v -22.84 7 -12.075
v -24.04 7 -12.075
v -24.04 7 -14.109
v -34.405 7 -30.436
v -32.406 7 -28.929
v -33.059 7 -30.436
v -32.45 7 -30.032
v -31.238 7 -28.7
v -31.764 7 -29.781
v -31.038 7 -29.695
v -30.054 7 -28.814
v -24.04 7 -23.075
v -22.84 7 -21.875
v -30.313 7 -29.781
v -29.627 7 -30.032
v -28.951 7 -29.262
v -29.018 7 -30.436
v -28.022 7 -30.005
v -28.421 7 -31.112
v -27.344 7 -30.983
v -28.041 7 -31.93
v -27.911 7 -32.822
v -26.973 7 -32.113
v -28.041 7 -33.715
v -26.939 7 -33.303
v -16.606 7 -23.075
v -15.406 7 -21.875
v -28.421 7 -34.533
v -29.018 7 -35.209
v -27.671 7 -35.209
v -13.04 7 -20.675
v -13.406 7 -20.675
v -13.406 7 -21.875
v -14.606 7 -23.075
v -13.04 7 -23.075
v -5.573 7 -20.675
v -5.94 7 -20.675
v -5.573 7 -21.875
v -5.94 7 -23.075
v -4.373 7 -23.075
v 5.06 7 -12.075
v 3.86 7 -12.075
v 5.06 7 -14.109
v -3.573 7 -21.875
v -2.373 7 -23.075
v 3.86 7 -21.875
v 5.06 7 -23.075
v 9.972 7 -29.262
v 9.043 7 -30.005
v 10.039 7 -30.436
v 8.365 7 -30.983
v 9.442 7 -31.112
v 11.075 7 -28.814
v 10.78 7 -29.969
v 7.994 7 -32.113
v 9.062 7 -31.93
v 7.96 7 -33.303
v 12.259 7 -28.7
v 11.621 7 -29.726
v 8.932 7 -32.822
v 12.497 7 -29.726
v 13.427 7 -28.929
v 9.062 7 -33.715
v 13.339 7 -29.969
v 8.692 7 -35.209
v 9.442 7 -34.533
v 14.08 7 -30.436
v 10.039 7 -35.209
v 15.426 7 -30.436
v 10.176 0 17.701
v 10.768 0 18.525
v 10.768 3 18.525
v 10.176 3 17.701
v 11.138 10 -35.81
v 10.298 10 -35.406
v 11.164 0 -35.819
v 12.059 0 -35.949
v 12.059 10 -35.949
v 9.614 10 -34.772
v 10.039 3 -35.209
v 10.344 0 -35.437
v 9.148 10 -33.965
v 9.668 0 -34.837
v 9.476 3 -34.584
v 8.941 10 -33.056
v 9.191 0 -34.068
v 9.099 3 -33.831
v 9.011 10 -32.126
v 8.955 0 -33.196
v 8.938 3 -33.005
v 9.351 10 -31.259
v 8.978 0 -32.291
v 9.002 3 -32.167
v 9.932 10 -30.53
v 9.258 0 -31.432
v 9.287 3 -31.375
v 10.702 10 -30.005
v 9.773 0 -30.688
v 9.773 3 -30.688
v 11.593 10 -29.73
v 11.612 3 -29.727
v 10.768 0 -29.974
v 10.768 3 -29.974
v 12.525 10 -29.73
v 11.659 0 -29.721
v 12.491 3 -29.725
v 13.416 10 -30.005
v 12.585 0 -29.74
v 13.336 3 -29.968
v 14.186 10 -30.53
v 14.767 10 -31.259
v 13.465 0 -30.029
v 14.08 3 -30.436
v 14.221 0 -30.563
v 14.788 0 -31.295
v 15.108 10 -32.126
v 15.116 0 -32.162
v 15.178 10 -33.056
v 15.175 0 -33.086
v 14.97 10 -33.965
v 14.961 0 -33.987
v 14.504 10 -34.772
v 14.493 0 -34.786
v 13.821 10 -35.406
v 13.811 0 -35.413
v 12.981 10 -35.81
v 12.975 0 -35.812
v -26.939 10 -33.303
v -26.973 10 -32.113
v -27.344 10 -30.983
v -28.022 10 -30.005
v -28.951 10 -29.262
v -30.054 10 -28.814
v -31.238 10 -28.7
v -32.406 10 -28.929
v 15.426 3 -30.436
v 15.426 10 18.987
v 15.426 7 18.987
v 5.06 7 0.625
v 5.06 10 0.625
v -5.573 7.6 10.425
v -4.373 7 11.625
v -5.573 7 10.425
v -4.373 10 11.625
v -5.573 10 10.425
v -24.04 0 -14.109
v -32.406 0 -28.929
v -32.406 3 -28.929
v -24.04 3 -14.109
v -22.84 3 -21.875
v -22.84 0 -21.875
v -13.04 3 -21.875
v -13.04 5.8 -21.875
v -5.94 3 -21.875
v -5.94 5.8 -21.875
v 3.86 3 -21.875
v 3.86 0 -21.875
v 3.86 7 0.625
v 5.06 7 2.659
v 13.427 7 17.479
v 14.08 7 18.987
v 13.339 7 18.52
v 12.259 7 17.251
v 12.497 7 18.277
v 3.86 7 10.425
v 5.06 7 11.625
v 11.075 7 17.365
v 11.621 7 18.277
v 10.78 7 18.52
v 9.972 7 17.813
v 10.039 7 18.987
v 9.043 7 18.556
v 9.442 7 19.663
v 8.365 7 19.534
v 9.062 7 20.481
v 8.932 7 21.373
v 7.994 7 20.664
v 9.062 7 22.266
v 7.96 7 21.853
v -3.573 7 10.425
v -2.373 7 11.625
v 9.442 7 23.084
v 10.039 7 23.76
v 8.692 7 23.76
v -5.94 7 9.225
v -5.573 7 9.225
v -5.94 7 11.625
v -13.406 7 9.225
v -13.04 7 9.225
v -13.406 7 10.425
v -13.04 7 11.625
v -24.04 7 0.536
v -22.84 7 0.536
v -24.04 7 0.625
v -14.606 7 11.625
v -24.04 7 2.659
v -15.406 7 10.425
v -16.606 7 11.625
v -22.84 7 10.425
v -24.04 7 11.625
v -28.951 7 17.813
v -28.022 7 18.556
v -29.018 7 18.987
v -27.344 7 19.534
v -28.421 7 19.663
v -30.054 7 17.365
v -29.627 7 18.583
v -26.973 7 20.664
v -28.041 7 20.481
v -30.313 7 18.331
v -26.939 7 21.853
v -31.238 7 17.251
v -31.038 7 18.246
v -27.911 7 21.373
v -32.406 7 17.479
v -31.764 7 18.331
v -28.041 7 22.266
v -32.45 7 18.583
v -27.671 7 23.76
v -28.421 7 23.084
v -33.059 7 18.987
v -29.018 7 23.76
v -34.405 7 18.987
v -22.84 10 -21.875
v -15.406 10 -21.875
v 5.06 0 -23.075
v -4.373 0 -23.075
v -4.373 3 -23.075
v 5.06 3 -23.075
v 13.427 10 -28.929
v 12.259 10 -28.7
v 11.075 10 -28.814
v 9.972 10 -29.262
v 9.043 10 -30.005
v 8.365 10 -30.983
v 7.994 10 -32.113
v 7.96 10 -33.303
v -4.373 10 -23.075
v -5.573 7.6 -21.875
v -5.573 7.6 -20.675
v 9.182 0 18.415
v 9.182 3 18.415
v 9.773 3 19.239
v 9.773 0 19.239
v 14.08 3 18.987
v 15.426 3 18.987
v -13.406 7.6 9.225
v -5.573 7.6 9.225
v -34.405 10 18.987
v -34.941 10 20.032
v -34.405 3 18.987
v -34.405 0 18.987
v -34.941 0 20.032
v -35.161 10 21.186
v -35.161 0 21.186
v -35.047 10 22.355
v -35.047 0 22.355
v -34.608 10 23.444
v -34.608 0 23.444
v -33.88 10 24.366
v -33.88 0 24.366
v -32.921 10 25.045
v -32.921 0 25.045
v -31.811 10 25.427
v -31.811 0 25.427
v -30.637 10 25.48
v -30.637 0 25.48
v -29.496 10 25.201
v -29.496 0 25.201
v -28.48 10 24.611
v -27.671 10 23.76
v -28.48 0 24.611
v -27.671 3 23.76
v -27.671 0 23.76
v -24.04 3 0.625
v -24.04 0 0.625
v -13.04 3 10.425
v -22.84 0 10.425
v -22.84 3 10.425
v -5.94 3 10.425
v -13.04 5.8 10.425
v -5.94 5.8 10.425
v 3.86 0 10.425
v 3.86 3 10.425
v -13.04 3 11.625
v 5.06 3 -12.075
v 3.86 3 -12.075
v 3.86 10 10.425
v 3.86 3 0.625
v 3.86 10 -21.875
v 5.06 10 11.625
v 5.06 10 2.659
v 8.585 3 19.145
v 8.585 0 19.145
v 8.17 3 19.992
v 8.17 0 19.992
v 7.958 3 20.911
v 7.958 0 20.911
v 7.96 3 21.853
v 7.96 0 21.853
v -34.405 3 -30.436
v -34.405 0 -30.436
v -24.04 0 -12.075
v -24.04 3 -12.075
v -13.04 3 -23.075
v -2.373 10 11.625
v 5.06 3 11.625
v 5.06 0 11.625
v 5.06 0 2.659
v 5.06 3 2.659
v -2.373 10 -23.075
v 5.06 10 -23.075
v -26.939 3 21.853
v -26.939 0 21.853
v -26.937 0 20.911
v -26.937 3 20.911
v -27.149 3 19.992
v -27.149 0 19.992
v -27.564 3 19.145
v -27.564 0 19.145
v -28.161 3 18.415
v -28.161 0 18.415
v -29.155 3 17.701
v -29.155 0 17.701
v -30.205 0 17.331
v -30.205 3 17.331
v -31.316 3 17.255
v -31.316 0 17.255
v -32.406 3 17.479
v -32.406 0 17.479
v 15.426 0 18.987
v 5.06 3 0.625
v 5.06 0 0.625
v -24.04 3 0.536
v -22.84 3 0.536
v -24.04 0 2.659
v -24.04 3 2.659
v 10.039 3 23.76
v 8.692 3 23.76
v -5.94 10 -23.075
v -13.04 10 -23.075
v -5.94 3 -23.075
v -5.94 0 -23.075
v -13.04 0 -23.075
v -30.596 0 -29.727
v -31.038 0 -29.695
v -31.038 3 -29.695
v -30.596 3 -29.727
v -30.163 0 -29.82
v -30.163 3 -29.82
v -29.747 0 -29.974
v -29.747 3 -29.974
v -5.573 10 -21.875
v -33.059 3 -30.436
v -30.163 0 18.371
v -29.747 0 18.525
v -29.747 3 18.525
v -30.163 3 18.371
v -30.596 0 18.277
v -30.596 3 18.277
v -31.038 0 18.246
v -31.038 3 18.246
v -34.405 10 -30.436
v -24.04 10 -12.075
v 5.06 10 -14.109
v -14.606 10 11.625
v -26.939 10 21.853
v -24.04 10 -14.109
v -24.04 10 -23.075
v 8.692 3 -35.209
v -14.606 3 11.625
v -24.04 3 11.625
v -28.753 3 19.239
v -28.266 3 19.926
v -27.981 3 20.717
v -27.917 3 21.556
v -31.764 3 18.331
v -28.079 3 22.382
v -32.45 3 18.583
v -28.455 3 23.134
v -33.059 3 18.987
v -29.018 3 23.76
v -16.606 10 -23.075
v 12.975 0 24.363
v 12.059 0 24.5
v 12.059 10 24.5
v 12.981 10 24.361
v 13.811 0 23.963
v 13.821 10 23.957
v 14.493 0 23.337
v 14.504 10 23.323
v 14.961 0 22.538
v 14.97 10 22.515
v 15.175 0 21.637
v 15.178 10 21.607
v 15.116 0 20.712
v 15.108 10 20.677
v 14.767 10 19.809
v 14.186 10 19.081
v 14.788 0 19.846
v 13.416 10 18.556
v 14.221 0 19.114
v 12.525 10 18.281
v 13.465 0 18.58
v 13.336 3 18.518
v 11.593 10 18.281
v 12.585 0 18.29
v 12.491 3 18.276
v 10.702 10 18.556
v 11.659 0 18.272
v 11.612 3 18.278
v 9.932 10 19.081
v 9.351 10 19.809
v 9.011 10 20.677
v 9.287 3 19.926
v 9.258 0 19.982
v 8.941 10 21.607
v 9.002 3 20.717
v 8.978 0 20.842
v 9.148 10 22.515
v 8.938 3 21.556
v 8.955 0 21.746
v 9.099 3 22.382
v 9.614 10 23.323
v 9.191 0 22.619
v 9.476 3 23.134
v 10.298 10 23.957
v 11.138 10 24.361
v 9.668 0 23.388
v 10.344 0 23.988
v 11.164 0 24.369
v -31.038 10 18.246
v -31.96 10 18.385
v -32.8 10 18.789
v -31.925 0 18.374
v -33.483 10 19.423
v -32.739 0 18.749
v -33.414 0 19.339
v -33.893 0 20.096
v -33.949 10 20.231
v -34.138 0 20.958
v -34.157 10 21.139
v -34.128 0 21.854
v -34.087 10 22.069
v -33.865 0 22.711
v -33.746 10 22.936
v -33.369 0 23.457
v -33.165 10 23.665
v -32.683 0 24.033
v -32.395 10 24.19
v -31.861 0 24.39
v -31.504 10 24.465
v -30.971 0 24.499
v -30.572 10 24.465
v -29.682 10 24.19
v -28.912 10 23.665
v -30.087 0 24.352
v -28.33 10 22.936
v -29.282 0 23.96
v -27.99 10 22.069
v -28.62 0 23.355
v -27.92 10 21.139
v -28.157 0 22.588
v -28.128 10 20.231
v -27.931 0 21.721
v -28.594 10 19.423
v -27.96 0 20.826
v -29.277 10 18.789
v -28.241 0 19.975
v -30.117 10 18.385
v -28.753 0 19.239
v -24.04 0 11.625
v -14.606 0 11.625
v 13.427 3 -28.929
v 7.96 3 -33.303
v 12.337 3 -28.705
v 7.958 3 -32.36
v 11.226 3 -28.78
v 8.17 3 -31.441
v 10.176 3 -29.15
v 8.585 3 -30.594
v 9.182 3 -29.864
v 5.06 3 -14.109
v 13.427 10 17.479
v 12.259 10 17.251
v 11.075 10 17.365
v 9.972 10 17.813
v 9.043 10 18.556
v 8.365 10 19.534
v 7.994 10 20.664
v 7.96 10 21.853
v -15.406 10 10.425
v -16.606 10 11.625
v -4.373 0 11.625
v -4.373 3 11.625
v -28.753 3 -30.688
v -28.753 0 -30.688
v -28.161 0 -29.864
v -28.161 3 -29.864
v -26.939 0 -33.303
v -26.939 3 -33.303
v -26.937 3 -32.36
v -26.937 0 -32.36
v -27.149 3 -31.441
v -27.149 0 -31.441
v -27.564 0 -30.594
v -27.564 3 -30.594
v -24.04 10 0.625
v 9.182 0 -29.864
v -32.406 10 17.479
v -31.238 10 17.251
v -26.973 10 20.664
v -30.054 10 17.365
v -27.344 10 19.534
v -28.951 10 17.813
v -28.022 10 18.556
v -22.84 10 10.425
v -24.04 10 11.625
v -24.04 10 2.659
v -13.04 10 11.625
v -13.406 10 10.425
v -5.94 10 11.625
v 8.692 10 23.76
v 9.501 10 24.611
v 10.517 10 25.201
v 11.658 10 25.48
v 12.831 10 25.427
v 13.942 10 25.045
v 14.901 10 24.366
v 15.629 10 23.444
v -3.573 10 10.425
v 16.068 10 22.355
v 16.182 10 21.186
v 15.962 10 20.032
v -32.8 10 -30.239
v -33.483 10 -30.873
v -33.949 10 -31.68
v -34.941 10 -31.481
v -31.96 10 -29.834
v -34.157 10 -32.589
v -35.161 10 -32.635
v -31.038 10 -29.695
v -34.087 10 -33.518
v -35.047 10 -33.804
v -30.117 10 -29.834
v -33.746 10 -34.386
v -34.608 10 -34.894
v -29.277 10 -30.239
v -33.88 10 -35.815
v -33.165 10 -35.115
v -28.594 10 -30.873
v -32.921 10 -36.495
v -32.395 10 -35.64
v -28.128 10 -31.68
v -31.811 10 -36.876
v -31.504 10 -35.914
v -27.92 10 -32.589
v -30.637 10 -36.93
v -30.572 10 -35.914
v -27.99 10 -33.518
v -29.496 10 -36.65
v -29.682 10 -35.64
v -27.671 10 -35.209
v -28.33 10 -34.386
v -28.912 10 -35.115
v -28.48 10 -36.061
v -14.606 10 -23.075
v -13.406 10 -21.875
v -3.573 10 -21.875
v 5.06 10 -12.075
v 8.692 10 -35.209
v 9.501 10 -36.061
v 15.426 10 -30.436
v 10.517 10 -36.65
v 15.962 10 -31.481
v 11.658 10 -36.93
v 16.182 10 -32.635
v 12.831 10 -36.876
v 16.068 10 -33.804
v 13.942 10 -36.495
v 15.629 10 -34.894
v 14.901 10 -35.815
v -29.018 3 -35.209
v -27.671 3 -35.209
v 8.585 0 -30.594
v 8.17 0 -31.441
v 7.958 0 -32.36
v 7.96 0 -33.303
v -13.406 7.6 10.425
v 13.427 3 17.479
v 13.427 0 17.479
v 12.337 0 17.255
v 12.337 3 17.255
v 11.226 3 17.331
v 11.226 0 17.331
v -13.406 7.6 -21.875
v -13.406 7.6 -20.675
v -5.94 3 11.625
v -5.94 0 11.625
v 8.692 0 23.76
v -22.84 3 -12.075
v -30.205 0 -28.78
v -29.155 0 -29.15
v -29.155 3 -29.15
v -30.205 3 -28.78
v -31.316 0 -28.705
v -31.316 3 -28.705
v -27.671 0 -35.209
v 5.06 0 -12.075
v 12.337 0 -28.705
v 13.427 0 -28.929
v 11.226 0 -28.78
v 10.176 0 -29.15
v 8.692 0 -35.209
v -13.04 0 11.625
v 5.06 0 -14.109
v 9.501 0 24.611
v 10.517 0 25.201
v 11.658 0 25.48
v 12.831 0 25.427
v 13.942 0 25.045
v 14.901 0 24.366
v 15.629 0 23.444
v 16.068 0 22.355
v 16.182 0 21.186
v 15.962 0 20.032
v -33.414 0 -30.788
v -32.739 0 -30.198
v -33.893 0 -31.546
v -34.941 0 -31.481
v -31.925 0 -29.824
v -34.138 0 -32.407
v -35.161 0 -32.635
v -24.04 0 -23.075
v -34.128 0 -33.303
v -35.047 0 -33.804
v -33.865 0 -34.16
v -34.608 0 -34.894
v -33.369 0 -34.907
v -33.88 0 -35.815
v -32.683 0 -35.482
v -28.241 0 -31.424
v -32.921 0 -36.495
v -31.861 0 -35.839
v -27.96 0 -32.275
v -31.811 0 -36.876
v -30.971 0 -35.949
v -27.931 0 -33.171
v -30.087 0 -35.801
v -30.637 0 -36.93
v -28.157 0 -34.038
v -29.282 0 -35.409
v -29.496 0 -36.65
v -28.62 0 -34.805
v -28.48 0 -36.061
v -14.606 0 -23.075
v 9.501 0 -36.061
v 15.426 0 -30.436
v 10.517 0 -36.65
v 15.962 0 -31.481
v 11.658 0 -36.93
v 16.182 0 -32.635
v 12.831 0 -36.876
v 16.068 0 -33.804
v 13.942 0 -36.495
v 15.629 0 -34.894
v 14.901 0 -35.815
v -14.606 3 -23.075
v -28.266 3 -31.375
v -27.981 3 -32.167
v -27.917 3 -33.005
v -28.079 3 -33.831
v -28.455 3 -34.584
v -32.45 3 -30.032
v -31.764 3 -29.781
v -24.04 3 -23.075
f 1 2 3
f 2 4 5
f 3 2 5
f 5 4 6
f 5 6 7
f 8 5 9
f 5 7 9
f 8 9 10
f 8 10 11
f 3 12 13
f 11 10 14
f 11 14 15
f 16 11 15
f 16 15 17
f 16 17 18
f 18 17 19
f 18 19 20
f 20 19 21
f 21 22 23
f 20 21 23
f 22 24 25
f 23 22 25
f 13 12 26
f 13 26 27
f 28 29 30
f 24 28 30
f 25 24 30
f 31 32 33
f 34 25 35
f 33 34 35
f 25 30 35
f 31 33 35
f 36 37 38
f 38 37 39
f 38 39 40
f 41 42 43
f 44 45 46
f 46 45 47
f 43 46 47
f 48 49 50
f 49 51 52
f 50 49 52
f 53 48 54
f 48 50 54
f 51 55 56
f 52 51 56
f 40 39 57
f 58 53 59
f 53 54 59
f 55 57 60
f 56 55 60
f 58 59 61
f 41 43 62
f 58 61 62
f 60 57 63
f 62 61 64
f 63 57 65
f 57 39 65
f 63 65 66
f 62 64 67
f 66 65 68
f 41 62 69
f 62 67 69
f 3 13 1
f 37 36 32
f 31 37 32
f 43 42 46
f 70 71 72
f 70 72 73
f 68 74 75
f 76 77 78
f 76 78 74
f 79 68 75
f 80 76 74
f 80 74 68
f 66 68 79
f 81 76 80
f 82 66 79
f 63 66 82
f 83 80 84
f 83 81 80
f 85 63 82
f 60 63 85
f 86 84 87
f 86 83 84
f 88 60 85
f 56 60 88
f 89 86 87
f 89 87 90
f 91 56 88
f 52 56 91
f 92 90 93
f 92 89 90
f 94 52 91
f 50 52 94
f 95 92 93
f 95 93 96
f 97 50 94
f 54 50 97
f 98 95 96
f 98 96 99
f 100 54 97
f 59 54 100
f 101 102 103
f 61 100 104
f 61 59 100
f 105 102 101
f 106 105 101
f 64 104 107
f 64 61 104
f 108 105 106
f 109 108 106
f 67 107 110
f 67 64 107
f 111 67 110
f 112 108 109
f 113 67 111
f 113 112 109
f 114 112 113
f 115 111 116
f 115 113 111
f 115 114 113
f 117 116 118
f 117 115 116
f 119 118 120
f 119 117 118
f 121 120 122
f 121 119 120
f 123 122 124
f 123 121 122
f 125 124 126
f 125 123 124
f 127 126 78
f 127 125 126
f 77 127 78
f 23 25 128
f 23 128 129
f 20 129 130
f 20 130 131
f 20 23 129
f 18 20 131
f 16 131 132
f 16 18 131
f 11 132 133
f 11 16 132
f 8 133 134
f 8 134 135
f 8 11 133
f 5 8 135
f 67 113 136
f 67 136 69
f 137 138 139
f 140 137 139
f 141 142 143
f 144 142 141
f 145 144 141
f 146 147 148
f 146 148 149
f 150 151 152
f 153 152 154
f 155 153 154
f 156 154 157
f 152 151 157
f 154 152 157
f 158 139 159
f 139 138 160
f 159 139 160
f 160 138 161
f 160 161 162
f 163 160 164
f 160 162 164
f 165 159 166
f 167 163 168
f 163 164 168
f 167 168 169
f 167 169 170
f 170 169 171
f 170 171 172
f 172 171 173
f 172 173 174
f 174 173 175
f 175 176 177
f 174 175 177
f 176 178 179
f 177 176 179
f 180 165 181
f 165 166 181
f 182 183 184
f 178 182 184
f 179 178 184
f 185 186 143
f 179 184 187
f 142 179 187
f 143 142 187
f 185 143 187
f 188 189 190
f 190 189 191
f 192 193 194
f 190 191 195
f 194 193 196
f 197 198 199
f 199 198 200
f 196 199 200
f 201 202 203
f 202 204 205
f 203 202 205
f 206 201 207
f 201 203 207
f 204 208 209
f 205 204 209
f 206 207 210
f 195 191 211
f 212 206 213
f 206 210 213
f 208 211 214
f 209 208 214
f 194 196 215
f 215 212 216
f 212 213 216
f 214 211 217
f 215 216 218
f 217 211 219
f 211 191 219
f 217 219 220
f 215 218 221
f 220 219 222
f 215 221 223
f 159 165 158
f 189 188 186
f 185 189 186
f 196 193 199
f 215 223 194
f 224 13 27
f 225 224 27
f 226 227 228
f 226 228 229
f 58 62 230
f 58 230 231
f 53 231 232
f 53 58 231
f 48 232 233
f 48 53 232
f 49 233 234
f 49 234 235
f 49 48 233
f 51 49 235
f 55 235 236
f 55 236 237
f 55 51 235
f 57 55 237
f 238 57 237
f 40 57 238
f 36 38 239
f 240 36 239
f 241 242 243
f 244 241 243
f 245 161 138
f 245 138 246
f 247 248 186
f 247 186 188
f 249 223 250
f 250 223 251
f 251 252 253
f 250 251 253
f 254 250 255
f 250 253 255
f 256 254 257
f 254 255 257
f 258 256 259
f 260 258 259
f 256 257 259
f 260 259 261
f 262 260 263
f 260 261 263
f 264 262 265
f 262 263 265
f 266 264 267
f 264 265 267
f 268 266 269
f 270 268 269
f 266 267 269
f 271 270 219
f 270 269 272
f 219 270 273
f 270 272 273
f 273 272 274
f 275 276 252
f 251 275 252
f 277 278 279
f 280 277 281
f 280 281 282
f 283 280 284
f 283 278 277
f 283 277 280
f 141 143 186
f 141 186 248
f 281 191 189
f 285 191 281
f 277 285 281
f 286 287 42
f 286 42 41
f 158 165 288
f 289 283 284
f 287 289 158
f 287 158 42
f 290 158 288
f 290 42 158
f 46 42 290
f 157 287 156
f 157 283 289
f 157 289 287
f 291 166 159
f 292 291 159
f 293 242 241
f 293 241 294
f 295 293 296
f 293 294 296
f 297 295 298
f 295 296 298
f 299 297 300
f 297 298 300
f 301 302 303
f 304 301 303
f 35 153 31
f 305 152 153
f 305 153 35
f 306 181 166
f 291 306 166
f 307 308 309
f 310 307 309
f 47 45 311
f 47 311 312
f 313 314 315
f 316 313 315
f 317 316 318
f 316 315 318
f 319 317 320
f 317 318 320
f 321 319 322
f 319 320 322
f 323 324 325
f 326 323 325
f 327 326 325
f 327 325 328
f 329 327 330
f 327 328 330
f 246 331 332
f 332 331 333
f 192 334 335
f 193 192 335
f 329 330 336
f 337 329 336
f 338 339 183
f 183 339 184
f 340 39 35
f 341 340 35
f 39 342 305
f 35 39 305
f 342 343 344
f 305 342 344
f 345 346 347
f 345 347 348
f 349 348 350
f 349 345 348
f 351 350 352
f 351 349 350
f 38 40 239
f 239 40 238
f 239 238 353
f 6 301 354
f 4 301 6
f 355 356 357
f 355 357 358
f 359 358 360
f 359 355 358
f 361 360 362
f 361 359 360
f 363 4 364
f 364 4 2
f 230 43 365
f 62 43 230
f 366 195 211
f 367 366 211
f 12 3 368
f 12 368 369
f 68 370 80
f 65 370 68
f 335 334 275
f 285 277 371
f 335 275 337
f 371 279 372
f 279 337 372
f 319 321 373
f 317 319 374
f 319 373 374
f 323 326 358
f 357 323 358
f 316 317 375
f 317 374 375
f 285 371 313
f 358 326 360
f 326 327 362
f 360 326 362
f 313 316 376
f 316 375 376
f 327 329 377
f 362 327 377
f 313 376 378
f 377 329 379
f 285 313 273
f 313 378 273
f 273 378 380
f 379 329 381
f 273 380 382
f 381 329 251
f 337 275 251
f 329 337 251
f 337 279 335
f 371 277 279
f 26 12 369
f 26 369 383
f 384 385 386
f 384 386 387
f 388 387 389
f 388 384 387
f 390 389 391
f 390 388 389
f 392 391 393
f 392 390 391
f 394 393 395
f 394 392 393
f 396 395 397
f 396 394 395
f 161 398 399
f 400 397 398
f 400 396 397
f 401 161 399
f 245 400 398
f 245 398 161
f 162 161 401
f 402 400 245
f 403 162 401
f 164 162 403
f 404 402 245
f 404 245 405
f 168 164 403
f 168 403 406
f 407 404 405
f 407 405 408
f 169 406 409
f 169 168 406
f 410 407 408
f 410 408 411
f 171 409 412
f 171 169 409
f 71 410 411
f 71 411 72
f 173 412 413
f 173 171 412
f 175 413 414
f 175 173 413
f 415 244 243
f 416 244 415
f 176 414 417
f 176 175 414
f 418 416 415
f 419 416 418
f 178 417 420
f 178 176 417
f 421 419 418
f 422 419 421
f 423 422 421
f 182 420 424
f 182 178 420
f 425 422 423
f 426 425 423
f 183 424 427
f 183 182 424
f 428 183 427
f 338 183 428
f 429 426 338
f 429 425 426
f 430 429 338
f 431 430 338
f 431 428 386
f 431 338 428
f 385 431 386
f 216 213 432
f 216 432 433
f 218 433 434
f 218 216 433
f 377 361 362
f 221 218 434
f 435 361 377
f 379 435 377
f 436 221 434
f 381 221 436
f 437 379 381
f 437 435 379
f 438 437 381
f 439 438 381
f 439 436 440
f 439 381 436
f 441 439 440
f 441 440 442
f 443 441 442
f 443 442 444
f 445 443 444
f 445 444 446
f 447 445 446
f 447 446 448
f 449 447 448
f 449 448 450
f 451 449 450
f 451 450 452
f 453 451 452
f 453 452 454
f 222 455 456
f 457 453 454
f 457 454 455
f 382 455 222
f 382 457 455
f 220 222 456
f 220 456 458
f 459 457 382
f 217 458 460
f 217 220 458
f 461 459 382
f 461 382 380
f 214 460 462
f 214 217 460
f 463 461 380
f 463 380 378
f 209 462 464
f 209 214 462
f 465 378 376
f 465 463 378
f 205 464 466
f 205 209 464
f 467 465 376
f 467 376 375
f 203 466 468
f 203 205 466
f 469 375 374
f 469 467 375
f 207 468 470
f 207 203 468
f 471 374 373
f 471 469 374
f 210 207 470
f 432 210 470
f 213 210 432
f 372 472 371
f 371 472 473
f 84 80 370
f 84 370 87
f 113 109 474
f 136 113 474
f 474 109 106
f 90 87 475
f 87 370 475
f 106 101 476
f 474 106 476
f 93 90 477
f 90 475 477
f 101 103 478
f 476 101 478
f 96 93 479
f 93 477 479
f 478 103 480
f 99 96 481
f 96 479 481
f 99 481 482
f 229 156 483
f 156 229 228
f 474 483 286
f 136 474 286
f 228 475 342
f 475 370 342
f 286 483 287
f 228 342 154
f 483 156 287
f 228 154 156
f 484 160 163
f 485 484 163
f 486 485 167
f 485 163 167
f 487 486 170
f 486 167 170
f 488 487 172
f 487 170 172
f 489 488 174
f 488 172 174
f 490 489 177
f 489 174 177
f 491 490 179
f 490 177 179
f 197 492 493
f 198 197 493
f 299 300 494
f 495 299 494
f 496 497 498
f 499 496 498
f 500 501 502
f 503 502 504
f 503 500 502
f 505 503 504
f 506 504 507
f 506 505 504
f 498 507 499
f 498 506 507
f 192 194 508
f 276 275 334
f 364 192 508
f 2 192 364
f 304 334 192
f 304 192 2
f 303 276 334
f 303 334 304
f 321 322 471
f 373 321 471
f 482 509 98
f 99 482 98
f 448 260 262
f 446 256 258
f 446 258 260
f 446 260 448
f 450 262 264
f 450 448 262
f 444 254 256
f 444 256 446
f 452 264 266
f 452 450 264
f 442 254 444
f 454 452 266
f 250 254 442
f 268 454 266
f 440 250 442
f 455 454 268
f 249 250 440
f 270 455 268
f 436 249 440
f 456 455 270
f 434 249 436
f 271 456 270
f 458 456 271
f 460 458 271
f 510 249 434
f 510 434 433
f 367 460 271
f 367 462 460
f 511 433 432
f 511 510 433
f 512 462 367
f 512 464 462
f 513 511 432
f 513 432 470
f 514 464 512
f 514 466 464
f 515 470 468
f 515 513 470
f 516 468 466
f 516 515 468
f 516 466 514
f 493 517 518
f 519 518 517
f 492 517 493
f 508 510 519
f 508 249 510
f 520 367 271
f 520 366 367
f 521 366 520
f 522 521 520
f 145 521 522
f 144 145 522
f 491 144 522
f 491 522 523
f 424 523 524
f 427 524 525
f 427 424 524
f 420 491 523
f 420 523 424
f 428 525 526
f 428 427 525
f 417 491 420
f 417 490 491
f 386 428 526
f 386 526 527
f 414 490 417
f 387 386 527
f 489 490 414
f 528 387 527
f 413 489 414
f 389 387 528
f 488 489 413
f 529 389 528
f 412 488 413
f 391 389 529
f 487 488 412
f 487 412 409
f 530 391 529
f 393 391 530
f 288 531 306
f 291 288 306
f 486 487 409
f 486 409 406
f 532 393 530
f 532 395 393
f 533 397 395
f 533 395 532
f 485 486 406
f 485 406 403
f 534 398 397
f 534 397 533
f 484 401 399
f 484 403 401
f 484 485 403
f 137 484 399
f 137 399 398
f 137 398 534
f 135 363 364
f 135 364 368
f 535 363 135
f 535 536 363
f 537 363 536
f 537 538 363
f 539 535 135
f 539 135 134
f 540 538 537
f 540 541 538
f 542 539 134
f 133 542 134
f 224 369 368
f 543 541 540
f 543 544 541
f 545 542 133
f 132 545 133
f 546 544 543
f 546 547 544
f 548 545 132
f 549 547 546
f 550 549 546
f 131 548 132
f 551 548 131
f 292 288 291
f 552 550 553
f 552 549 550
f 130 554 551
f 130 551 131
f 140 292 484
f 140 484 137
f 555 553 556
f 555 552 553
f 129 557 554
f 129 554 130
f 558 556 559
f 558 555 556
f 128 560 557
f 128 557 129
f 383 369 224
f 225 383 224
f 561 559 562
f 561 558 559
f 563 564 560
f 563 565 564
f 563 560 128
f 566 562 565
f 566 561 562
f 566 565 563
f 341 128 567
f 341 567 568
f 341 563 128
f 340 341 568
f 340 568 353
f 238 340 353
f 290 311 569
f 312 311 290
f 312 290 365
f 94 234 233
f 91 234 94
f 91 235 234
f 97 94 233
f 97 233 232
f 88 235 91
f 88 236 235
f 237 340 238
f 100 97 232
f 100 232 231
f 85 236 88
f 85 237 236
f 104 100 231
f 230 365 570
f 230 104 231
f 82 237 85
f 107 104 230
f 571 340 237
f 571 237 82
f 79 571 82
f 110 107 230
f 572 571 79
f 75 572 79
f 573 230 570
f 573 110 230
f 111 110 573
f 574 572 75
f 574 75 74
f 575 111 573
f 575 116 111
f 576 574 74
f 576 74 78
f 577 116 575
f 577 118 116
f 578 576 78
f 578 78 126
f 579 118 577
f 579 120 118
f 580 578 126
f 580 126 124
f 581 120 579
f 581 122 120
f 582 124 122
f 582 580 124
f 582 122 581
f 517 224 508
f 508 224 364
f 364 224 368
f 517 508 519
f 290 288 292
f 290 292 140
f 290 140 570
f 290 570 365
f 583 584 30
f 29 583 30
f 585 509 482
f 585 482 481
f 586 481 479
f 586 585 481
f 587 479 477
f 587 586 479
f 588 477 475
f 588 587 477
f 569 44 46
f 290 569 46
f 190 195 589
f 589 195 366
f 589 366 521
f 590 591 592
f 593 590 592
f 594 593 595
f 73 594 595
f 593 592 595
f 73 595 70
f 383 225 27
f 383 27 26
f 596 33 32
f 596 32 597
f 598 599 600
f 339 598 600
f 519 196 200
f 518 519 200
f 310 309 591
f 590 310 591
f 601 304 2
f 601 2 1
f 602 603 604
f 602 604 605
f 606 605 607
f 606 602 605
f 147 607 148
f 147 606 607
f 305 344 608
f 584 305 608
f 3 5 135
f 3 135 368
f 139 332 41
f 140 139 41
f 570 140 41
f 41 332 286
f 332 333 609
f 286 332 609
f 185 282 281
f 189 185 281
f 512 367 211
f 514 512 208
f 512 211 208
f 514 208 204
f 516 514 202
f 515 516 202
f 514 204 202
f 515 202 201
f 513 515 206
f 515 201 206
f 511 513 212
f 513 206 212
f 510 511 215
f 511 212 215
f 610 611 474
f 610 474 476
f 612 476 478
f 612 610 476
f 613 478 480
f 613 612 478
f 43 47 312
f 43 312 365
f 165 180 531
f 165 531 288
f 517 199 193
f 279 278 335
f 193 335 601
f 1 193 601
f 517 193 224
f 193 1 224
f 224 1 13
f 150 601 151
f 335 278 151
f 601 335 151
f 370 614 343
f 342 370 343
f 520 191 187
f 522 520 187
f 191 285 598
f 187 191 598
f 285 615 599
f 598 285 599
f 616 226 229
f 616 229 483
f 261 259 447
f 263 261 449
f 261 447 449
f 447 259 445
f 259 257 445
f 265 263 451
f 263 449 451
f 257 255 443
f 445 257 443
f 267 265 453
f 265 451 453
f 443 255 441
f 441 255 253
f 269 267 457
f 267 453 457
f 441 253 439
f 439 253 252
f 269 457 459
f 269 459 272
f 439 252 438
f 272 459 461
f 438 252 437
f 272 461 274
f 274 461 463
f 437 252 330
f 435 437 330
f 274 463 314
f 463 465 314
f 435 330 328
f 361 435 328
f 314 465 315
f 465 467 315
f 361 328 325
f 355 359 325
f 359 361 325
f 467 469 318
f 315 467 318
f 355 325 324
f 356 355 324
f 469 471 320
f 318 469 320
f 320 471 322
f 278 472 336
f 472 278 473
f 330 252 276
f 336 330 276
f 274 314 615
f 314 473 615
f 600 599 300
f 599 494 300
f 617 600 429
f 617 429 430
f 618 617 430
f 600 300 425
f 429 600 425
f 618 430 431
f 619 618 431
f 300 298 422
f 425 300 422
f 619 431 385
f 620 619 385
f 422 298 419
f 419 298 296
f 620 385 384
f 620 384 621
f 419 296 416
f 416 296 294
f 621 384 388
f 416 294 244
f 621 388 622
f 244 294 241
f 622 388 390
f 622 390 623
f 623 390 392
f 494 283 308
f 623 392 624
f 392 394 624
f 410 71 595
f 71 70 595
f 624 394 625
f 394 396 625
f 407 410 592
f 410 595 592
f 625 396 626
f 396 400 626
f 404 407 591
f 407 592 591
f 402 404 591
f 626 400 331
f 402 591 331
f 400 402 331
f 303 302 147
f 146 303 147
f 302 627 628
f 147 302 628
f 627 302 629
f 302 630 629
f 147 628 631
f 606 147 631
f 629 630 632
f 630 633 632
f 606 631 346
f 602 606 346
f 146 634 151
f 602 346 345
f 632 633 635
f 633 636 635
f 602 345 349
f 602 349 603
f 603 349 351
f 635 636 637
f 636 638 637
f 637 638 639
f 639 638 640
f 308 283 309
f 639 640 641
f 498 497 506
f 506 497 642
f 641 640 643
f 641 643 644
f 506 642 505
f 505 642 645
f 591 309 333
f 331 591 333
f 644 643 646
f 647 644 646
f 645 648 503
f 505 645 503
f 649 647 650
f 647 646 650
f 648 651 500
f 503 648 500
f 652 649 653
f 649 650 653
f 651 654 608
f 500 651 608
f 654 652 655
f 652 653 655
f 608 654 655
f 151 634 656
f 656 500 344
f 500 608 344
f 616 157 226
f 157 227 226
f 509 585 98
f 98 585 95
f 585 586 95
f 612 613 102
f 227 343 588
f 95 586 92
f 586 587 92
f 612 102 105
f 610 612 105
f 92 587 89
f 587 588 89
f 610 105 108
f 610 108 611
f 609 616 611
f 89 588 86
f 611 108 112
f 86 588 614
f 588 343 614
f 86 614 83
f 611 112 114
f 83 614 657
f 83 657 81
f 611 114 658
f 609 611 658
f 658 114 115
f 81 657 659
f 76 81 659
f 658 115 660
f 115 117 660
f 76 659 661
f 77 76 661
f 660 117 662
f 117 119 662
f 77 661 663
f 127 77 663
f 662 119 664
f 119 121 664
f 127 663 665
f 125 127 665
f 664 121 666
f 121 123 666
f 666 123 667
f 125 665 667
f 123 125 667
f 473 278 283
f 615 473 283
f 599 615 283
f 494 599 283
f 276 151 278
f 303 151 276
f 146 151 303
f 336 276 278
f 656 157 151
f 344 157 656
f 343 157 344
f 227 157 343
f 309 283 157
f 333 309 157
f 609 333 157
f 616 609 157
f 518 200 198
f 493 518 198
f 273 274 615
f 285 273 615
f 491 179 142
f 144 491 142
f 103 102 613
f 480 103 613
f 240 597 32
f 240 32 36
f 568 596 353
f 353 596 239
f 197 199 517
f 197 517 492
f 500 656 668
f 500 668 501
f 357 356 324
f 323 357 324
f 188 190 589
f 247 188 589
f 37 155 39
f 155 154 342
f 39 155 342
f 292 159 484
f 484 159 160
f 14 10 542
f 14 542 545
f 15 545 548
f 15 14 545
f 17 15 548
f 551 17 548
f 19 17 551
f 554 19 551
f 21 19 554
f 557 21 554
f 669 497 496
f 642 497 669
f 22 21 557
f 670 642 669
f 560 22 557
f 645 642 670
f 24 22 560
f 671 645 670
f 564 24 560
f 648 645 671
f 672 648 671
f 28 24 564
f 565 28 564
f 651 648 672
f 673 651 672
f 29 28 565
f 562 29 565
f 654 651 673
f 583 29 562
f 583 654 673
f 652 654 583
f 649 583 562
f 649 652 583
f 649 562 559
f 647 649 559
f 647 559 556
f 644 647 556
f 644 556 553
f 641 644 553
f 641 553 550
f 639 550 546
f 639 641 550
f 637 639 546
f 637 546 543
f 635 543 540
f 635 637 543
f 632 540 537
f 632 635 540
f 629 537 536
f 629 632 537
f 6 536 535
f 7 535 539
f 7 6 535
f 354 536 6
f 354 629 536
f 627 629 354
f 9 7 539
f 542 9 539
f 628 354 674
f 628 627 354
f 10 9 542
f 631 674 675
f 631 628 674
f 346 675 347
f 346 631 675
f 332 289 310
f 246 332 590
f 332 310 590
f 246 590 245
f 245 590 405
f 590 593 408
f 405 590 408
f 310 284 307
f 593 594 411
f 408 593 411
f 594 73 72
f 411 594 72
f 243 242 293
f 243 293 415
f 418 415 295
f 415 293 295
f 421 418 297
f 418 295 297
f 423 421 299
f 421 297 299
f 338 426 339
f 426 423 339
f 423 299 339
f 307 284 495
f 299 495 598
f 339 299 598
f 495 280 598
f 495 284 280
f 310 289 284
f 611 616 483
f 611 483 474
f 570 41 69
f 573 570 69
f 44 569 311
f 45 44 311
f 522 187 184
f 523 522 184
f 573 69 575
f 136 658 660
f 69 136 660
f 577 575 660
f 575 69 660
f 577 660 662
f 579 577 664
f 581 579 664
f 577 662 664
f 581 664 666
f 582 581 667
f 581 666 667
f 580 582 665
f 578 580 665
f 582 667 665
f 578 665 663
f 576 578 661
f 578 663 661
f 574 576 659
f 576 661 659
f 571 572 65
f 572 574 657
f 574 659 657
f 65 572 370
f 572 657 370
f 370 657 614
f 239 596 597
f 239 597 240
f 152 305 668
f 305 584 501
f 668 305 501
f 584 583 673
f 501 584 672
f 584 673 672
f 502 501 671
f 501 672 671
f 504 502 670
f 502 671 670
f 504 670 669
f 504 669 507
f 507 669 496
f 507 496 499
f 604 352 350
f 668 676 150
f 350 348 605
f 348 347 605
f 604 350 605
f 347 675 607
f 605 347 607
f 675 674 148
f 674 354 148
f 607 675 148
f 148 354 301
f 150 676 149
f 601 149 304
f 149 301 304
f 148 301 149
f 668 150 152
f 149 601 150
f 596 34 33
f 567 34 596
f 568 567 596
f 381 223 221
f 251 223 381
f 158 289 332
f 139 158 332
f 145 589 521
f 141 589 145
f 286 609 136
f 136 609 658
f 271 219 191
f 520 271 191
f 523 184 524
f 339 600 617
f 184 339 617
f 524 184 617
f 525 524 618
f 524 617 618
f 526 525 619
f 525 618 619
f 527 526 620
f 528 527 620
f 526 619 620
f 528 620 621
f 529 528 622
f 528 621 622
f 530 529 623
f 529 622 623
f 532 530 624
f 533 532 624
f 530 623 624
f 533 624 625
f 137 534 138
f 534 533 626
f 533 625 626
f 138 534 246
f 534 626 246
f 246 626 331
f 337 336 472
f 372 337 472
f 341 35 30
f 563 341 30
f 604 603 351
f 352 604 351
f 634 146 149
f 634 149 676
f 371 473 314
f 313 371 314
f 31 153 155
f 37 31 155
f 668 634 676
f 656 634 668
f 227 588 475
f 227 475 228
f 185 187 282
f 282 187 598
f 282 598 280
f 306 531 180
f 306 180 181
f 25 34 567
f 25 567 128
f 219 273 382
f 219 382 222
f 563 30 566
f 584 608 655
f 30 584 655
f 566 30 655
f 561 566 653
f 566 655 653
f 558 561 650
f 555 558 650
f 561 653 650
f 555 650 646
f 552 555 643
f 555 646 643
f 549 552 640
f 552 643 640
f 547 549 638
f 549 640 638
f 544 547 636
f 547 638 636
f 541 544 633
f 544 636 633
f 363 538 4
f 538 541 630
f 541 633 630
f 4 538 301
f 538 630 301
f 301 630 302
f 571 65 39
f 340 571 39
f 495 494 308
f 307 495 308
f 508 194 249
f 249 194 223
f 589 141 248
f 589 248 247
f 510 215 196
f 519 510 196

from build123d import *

# Parameters (mm, degrees)
SKETCH2_R               = 3.127
SKETCH2_W               = 26.7
SKETCH2_H               = 32.3
BOSS_EXTRUDE1_DEPTH     = 10
CUT_EXTRUDE1_DEPTH      = 52.979378239
CUT_EXTRUDE1_DEPTH_BACK = 52.979378239
CUT_EXTRUDE2_DEPTH      = 52.979378239
CUT_EXTRUDE2_DEPTH_BACK = 52.979378239
CUT_EXTRUDE3_REACH      = 60.213
CUT_EXTRUDE3_END_RADIUS = 3.127
SKETCH6_W               = 4.772967813
SKETCH6_H               = 4
CUT_EXTRUDE4_REACH      = 60.213
CUT_EXTRUDE4_END_RADIUS = 3.127
SKETCH7_W               = 4.772967813
SKETCH7_H               = 4
CUT_EXTRUDE5_REACH      = 60.213
CUT_EXTRUDE5_END_RADIUS = 3.127
SKETCH8_W               = 4.772967813
SKETCH8_H               = 4
CUT_EXTRUDE6_REACH      = 60.213
CUT_EXTRUDE6_END_RADIUS = 3.127
SKETCH9_W               = 4.772967813
SKETCH9_H               = 4
SKETCH10_W              = 1.2
SKETCH10_H              = 12.610624374
SKETCH10_W_2            = 7.1
SKETCH10_H_2            = 1.2
SKETCH10_H_3            = 12.7
BOSS_EXTRUDE2_DEPTH     = 4
CUT_EXTRUDE7_DEPTH      = 3
CUT_EXTRUDE9_DEPTH      = 3
SKETCH13_W              = 7.833075365
SKETCH13_H              = 0.6
BOSS_EXTRUDE3_DEPTH     = 1.2
CHAMFER1_SIZE           = 1.2
SKETCH14_W              = 7.833075365
SKETCH14_H              = 0.6
BOSS_EXTRUDE4_DEPTH     = 1.2
CHAMFER2_SIZE           = 1.2


with BuildPart() as part:
    # Sketch2 → Boss-Extrude1 (new body)
    with BuildSketch(Plane(origin=(0, 0, 0), x_dir=(1, 0, 0), z_dir=(0, 1, 0))):
        with BuildLine():
            Line((-34.405486348, 30.435899661), (-24.03957695, 12.074655042))
            Line((-24.03957695, 12.074655042), (-24.03957695, -0.625344958))
            Line((-24.03957695, -0.625344958), (-34.405486348, -18.986589577))
            ThreePointArc((-34.405486348, -18.986589577), (-33.424886075, -24.740002888), (-27.671446386, -23.75955739))
            Line((-27.671446386, -23.75955739), (-13.03957695, -11.625344958))
            Line((-13.03957695, -11.625344958), (-5.93957695, -11.625344958))
            Line((-5.93957695, -11.625344958), (8.692292487, -23.75955739))
            ThreePointArc((8.692292487, -23.75955739), (14.445732176, -24.740002888), (15.426332449, -18.986589577))
            Line((15.426332449, -18.986589577), (5.06042305, -0.625344958))
            Line((5.06042305, -0.625344958), (5.06042305, 12.074655042))
            Line((5.06042305, 12.074655042), (15.426332449, 30.435899661))
            ThreePointArc((15.426332449, 30.435899661), (14.445732176, 36.189312973), (8.692292487, 35.208867474))
            Line((8.692292487, 35.208867474), (-5.93957695, 23.074655042))
            Line((-5.93957695, 23.074655042), (-13.03957695, 23.074655042))
            Line((-13.03957695, 23.074655042), (-27.671446386, 35.208867474))
            ThreePointArc((-27.671446386, 35.208867474), (-33.424886075, 36.189312973), (-34.405486348, 30.435899661))
        make_face()
        with Locations(Location((-31.038402168, 32.82229299, 0), (0, 0, 270))):
            Circle(SKETCH2_R, mode=Mode.SUBTRACT)
        with Locations(Location((12.059248268, 32.82229299, 0), (0, 0, 90))):
            Circle(SKETCH2_R, mode=Mode.SUBTRACT)
        with Locations(Location((-31.038402168, -21.372982906, 0), (0, 0, 90))):
            Circle(SKETCH2_R, mode=Mode.SUBTRACT)
        with Locations(Location((12.059248268, -21.372982906, 0), (0, 0, 270))):
            Circle(SKETCH2_R, mode=Mode.SUBTRACT)
        with BuildLine():
            Line((-24.03957695, 23.074655042), (-14.606114632, 23.074655042))
            Line((-14.606114632, 23.074655042), (-26.939458612, 33.302699824))
            ThreePointArc((-26.939458612, 33.302699824), (-28.459986314, 29.599886951), (-32.406136372, 28.928524617))
            Line((-32.406136372, 28.928524617), (-24.03957695, 14.108749692))
            Line((-24.03957695, 14.108749692), (-24.03957695, 23.074655042))
        make_face(mode=Mode.SUBTRACT)
        with Locations((-9.48957695, 5.724655042)):
            Rectangle(SKETCH2_W, SKETCH2_H, mode=Mode.SUBTRACT)
        with BuildLine():
            Line((5.06042305, 23.074655042), (5.06042305, 14.108749692))
            Line((5.06042305, 14.108749692), (13.426982473, 28.928524617))
            ThreePointArc((13.426982473, 28.928524617), (9.480832414, 29.599886951), (7.960304713, 33.302699824))
            Line((7.960304713, 33.302699824), (-4.373039267, 23.074655042))
            Line((-4.373039267, 23.074655042), (5.06042305, 23.074655042))
        make_face(mode=Mode.SUBTRACT)
        with BuildLine():
            Line((-24.03957695, -11.625344958), (-14.606114632, -11.625344958))
            Line((-14.606114632, -11.625344958), (-26.939458612, -21.85338974))
            ThreePointArc((-26.939458612, -21.85338974), (-28.459986314, -18.150576866), (-32.406136372, -17.479214533))
            Line((-32.406136372, -17.479214533), (-24.03957695, -2.659439608))
            Line((-24.03957695, -2.659439608), (-24.03957695, -11.625344958))
        make_face(mode=Mode.SUBTRACT)
        with BuildLine():
            Line((7.960304713, -21.85338974), (-4.373039267, -11.625344958))
            Line((-4.373039267, -11.625344958), (5.06042305, -11.625344958))
            Line((5.06042305, -11.625344958), (5.06042305, -2.659439608))
            Line((5.06042305, -2.659439608), (13.426982473, -17.479214533))
            ThreePointArc((13.426982473, -17.479214533), (9.480832414, -18.150576866), (7.960304713, -21.85338974))
        make_face(mode=Mode.SUBTRACT)
    extrude(amount=BOSS_EXTRUDE1_DEPTH)

    # Sketch4 → Cut-Extrude1 (cut, two sides: drawn at the far end of the back side and taken through both)
    with BuildSketch(Plane(origin=(0, 0, 0), x_dir=(0, 0, -1), z_dir=(1, 0, 0)).offset(-CUT_EXTRUDE1_DEPTH_BACK)):
        Polygon((-18.986589577, 5), (-18.986589577, 7), (30.435899661, 7), (30.435899661, 5), (30.435899661, 3), (-18.986589577, 3), align=None)
    extrude(amount=CUT_EXTRUDE1_DEPTH + CUT_EXTRUDE1_DEPTH_BACK, mode=Mode.SUBTRACT)

    # Sketch5 → Cut-Extrude2 (cut, two sides: drawn at the far end of the back side and taken through both)
    with BuildSketch(Plane.XY.offset(-CUT_EXTRUDE2_DEPTH_BACK)):
        Polygon((-27.671446386, 5), (-27.671446386, 7), (8.692292487, 7), (8.692292487, 5), (8.692292487, 3), (-27.671446386, 3), align=None)
    extrude(amount=CUT_EXTRUDE2_DEPTH + CUT_EXTRUDE2_DEPTH_BACK, mode=Mode.SUBTRACT)

    # Cut-Extrude3: up to this cylinder (the profile starts outside it)
    cut_extrude3_end = Plane(origin=(-31.038402168, 5, -32.82229299), z_dir=(0, -1, 0)) * Cylinder(CUT_EXTRUDE3_END_RADIUS, 127.68, mode=Mode.PRIVATE)
    # Sketch6 → Cut-Extrude3 (cut, up to the surface)
    with BuildSketch(Plane(origin=(-27.671446386, 0, 0), x_dir=(0, 0, -1), z_dir=(1, 0, 0)), mode=Mode.PRIVATE) as cut_extrude3_sk1:
        with Locations((32.822383567, 5)):
            Rectangle(SKETCH6_W, SKETCH6_H)
    cut_extrude3_tool1 = extrude(cut_extrude3_sk1.sketch, amount=-CUT_EXTRUDE3_REACH, mode=Mode.PRIVATE) - cut_extrude3_end
    add(cut_extrude3_tool1.solids().sort_by_distance((-27.671446, 5, -32.822384))[0], mode=Mode.SUBTRACT)

    # Cut-Extrude4: up to this cylinder (the profile starts outside it)
    cut_extrude4_end = Plane(origin=(-31.038402168, 5, 21.372982906), z_dir=(0, -1, 0)) * Cylinder(CUT_EXTRUDE4_END_RADIUS, 127.68, mode=Mode.PRIVATE)
    # Sketch7 → Cut-Extrude4 (cut, up to the surface)
    with BuildSketch(Plane(origin=(-27.671446386, 0, 0), x_dir=(0, 0, -1), z_dir=(1, 0, 0)), mode=Mode.PRIVATE) as cut_extrude4_sk1:
        with Locations((-21.373073484, 5)):
            Rectangle(SKETCH7_W, SKETCH7_H)
    cut_extrude4_tool1 = extrude(cut_extrude4_sk1.sketch, amount=-CUT_EXTRUDE4_REACH, mode=Mode.PRIVATE) - cut_extrude4_end
    add(cut_extrude4_tool1.solids().sort_by_distance((-27.671446, 5, 21.373073))[0], mode=Mode.SUBTRACT)

    # Cut-Extrude5: up to this cylinder (the profile starts outside it)
    cut_extrude5_end = Plane(origin=(12.059248268, 5, -32.82229299), z_dir=(0, -1, 0)) * Cylinder(CUT_EXTRUDE5_END_RADIUS, 127.68, mode=Mode.PRIVATE)
    # Sketch8 → Cut-Extrude5 (cut, up to the surface)
    with BuildSketch(Plane.ZY.offset(-8.692292487), mode=Mode.PRIVATE) as cut_extrude5_sk1:
        with Locations((-32.822383567, 5)):
            Rectangle(SKETCH8_W, SKETCH8_H)
    cut_extrude5_tool1 = extrude(cut_extrude5_sk1.sketch, amount=-CUT_EXTRUDE5_REACH, mode=Mode.PRIVATE) - cut_extrude5_end
    add(cut_extrude5_tool1.solids().sort_by_distance((8.692292, 5, -32.822384))[0], mode=Mode.SUBTRACT)

    # Cut-Extrude6: up to this cylinder (the profile starts outside it)
    cut_extrude6_end = Plane(origin=(12.059248268, 5, 21.372982906), z_dir=(0, -1, 0)) * Cylinder(CUT_EXTRUDE6_END_RADIUS, 127.68, mode=Mode.PRIVATE)
    # Sketch9 → Cut-Extrude6 (cut, up to the surface)
    with BuildSketch(Plane.ZY.offset(-8.692292487), mode=Mode.PRIVATE) as cut_extrude6_sk1:
        with Locations((21.373073484, 5)):
            Rectangle(SKETCH9_W, SKETCH9_H)
    cut_extrude6_tool1 = extrude(cut_extrude6_sk1.sketch, amount=-CUT_EXTRUDE6_REACH, mode=Mode.PRIVATE) - cut_extrude6_end
    add(cut_extrude6_tool1.solids().sort_by_distance((8.692292, 5, 21.373073))[0], mode=Mode.SUBTRACT)

    # Sketch10 → Boss-Extrude2 (add)
    with BuildSketch(Plane(origin=(0, 3, 0), x_dir=(1, 0, 0), z_dir=(0, 1, 0))):
        with Locations((-23.43957695, 5.769342855)):
            Rectangle(SKETCH10_W, SKETCH10_H)
        with Locations((-9.48957695, 22.474655042)):
            Rectangle(SKETCH10_W_2, SKETCH10_H_2)
        with Locations((4.46042305, 5.724655042)):
            Rectangle(SKETCH10_W, SKETCH10_H_3)
        with Locations((-9.48957695, -11.025344958)):
            Rectangle(SKETCH10_W_2, SKETCH10_H_2)
    extrude(amount=BOSS_EXTRUDE2_DEPTH)

    # Sketch11 → Cut-Extrude7 (cut)
    with BuildSketch(Plane.XZ):
        with BuildLine():
            ThreePointArc((9.773467047, -30.688438916), (10.235471064, -30.282221002), (10.768064045, -29.974316112))
            Line((10.768064045, -29.974316112), (10.176165075, -29.14994678))
            ThreePointArc((10.176165075, -29.14994678), (9.652235629, -29.469917839), (9.181568077, -29.864069585))
            Line((9.181568077, -29.864069585), (9.773467047, -30.688438916))
        make_face()
        with BuildLine():
            ThreePointArc((-28.160721976, -29.864069585), (-28.631389528, -29.469917839), (-29.155318974, -29.14994678))
            Line((-29.155318974, -29.14994678), (-29.747217945, -29.974316112))
            ThreePointArc((-29.747217945, -29.974316112), (-29.214624963, -30.282221002), (-28.752620946, -30.688438916))
            Line((-28.752620946, -30.688438916), (-28.160721976, -29.864069585))
        make_face()
        with BuildLine():
            Line((-28.160721976, 18.414759501), (-28.752620946, 19.239128832))
            ThreePointArc((-28.752620946, 19.239128832), (-29.214624963, 18.832910917), (-29.747217945, 18.525006027))
            Line((-29.747217945, 18.525006027), (-29.155318974, 17.700636696))
            ThreePointArc((-29.155318974, 17.700636696), (-28.631389528, 18.020607755), (-28.160721976, 18.414759501))
        make_face()
        Polygon((11.073162581, 18.949933064), (9.804267287, 17.182674769), (8.809670289, 17.896797574), (10.078565582, 19.664055869), align=None)
    extrude(amount=-CUT_EXTRUDE7_DEPTH, mode=Mode.SUBTRACT)

    # Sketch12 → Cut-Extrude9 (cut)
    with BuildSketch(Plane(origin=(0, 10, 0), x_dir=(1, 0, 0), z_dir=(0, 1, 0))):
        Polygon((-14.606114632, 23.074655042), (-13.406114632, 21.874655042), (-15.406114632, 21.874655042), (-16.606114632, 23.074655042), align=None)
        Polygon((-3.573039267, 21.874655042), (-2.373039267, 23.074655042), (-4.373039267, 23.074655042), (-5.573039267, 21.874655042), align=None)
        Polygon((-15.406114632, -10.425344958), (-16.606114632, -11.625344958), (-14.606114632, -11.625344958), (-13.406114632, -10.425344958), align=None)
        Polygon((-5.573039267, -10.425344958), (-3.573039267, -10.425344958), (-2.373039267, -11.625344958), (-4.373039267, -11.625344958), align=None)
    extrude(amount=-CUT_EXTRUDE9_DEPTH, mode=Mode.SUBTRACT)

    # Sketch13 → Boss-Extrude3 (add)
    with BuildSketch(Plane.XY.offset(-21.874655042)):
        with Locations((-9.48957695, 7.3)):
            Rectangle(SKETCH13_W, SKETCH13_H)
    extrude(amount=BOSS_EXTRUDE3_DEPTH)

    # Chamfer1
    chamfer1_edges = [part.edges().sort_by_distance(p)[0] for p in [
        (-9.48957695, 7, -21.874655042),
    ]]
    chamfer(chamfer1_edges, length=CHAMFER1_SIZE - 0.0001)  # a hair under: the kernel refuses the full size

    # Sketch14 → Boss-Extrude4 (add)
    with BuildSketch(Plane(origin=(0, 0, 10.425344958), x_dir=(-1, 0, 0), z_dir=(0, 0, -1))):
        with Locations((9.48957695, 7.3)):
            Rectangle(SKETCH14_W, SKETCH14_H)
    extrude(amount=BOSS_EXTRUDE4_DEPTH)

    # Chamfer2
    chamfer2_edges = [part.edges().sort_by_distance(p)[0] for p in [
        (-9.48957695, 7, 10.425344958),
    ]]
    chamfer(chamfer2_edges, length=CHAMFER2_SIZE - 0.0001)  # a hair under: the kernel refuses the full size


solid = part.part
